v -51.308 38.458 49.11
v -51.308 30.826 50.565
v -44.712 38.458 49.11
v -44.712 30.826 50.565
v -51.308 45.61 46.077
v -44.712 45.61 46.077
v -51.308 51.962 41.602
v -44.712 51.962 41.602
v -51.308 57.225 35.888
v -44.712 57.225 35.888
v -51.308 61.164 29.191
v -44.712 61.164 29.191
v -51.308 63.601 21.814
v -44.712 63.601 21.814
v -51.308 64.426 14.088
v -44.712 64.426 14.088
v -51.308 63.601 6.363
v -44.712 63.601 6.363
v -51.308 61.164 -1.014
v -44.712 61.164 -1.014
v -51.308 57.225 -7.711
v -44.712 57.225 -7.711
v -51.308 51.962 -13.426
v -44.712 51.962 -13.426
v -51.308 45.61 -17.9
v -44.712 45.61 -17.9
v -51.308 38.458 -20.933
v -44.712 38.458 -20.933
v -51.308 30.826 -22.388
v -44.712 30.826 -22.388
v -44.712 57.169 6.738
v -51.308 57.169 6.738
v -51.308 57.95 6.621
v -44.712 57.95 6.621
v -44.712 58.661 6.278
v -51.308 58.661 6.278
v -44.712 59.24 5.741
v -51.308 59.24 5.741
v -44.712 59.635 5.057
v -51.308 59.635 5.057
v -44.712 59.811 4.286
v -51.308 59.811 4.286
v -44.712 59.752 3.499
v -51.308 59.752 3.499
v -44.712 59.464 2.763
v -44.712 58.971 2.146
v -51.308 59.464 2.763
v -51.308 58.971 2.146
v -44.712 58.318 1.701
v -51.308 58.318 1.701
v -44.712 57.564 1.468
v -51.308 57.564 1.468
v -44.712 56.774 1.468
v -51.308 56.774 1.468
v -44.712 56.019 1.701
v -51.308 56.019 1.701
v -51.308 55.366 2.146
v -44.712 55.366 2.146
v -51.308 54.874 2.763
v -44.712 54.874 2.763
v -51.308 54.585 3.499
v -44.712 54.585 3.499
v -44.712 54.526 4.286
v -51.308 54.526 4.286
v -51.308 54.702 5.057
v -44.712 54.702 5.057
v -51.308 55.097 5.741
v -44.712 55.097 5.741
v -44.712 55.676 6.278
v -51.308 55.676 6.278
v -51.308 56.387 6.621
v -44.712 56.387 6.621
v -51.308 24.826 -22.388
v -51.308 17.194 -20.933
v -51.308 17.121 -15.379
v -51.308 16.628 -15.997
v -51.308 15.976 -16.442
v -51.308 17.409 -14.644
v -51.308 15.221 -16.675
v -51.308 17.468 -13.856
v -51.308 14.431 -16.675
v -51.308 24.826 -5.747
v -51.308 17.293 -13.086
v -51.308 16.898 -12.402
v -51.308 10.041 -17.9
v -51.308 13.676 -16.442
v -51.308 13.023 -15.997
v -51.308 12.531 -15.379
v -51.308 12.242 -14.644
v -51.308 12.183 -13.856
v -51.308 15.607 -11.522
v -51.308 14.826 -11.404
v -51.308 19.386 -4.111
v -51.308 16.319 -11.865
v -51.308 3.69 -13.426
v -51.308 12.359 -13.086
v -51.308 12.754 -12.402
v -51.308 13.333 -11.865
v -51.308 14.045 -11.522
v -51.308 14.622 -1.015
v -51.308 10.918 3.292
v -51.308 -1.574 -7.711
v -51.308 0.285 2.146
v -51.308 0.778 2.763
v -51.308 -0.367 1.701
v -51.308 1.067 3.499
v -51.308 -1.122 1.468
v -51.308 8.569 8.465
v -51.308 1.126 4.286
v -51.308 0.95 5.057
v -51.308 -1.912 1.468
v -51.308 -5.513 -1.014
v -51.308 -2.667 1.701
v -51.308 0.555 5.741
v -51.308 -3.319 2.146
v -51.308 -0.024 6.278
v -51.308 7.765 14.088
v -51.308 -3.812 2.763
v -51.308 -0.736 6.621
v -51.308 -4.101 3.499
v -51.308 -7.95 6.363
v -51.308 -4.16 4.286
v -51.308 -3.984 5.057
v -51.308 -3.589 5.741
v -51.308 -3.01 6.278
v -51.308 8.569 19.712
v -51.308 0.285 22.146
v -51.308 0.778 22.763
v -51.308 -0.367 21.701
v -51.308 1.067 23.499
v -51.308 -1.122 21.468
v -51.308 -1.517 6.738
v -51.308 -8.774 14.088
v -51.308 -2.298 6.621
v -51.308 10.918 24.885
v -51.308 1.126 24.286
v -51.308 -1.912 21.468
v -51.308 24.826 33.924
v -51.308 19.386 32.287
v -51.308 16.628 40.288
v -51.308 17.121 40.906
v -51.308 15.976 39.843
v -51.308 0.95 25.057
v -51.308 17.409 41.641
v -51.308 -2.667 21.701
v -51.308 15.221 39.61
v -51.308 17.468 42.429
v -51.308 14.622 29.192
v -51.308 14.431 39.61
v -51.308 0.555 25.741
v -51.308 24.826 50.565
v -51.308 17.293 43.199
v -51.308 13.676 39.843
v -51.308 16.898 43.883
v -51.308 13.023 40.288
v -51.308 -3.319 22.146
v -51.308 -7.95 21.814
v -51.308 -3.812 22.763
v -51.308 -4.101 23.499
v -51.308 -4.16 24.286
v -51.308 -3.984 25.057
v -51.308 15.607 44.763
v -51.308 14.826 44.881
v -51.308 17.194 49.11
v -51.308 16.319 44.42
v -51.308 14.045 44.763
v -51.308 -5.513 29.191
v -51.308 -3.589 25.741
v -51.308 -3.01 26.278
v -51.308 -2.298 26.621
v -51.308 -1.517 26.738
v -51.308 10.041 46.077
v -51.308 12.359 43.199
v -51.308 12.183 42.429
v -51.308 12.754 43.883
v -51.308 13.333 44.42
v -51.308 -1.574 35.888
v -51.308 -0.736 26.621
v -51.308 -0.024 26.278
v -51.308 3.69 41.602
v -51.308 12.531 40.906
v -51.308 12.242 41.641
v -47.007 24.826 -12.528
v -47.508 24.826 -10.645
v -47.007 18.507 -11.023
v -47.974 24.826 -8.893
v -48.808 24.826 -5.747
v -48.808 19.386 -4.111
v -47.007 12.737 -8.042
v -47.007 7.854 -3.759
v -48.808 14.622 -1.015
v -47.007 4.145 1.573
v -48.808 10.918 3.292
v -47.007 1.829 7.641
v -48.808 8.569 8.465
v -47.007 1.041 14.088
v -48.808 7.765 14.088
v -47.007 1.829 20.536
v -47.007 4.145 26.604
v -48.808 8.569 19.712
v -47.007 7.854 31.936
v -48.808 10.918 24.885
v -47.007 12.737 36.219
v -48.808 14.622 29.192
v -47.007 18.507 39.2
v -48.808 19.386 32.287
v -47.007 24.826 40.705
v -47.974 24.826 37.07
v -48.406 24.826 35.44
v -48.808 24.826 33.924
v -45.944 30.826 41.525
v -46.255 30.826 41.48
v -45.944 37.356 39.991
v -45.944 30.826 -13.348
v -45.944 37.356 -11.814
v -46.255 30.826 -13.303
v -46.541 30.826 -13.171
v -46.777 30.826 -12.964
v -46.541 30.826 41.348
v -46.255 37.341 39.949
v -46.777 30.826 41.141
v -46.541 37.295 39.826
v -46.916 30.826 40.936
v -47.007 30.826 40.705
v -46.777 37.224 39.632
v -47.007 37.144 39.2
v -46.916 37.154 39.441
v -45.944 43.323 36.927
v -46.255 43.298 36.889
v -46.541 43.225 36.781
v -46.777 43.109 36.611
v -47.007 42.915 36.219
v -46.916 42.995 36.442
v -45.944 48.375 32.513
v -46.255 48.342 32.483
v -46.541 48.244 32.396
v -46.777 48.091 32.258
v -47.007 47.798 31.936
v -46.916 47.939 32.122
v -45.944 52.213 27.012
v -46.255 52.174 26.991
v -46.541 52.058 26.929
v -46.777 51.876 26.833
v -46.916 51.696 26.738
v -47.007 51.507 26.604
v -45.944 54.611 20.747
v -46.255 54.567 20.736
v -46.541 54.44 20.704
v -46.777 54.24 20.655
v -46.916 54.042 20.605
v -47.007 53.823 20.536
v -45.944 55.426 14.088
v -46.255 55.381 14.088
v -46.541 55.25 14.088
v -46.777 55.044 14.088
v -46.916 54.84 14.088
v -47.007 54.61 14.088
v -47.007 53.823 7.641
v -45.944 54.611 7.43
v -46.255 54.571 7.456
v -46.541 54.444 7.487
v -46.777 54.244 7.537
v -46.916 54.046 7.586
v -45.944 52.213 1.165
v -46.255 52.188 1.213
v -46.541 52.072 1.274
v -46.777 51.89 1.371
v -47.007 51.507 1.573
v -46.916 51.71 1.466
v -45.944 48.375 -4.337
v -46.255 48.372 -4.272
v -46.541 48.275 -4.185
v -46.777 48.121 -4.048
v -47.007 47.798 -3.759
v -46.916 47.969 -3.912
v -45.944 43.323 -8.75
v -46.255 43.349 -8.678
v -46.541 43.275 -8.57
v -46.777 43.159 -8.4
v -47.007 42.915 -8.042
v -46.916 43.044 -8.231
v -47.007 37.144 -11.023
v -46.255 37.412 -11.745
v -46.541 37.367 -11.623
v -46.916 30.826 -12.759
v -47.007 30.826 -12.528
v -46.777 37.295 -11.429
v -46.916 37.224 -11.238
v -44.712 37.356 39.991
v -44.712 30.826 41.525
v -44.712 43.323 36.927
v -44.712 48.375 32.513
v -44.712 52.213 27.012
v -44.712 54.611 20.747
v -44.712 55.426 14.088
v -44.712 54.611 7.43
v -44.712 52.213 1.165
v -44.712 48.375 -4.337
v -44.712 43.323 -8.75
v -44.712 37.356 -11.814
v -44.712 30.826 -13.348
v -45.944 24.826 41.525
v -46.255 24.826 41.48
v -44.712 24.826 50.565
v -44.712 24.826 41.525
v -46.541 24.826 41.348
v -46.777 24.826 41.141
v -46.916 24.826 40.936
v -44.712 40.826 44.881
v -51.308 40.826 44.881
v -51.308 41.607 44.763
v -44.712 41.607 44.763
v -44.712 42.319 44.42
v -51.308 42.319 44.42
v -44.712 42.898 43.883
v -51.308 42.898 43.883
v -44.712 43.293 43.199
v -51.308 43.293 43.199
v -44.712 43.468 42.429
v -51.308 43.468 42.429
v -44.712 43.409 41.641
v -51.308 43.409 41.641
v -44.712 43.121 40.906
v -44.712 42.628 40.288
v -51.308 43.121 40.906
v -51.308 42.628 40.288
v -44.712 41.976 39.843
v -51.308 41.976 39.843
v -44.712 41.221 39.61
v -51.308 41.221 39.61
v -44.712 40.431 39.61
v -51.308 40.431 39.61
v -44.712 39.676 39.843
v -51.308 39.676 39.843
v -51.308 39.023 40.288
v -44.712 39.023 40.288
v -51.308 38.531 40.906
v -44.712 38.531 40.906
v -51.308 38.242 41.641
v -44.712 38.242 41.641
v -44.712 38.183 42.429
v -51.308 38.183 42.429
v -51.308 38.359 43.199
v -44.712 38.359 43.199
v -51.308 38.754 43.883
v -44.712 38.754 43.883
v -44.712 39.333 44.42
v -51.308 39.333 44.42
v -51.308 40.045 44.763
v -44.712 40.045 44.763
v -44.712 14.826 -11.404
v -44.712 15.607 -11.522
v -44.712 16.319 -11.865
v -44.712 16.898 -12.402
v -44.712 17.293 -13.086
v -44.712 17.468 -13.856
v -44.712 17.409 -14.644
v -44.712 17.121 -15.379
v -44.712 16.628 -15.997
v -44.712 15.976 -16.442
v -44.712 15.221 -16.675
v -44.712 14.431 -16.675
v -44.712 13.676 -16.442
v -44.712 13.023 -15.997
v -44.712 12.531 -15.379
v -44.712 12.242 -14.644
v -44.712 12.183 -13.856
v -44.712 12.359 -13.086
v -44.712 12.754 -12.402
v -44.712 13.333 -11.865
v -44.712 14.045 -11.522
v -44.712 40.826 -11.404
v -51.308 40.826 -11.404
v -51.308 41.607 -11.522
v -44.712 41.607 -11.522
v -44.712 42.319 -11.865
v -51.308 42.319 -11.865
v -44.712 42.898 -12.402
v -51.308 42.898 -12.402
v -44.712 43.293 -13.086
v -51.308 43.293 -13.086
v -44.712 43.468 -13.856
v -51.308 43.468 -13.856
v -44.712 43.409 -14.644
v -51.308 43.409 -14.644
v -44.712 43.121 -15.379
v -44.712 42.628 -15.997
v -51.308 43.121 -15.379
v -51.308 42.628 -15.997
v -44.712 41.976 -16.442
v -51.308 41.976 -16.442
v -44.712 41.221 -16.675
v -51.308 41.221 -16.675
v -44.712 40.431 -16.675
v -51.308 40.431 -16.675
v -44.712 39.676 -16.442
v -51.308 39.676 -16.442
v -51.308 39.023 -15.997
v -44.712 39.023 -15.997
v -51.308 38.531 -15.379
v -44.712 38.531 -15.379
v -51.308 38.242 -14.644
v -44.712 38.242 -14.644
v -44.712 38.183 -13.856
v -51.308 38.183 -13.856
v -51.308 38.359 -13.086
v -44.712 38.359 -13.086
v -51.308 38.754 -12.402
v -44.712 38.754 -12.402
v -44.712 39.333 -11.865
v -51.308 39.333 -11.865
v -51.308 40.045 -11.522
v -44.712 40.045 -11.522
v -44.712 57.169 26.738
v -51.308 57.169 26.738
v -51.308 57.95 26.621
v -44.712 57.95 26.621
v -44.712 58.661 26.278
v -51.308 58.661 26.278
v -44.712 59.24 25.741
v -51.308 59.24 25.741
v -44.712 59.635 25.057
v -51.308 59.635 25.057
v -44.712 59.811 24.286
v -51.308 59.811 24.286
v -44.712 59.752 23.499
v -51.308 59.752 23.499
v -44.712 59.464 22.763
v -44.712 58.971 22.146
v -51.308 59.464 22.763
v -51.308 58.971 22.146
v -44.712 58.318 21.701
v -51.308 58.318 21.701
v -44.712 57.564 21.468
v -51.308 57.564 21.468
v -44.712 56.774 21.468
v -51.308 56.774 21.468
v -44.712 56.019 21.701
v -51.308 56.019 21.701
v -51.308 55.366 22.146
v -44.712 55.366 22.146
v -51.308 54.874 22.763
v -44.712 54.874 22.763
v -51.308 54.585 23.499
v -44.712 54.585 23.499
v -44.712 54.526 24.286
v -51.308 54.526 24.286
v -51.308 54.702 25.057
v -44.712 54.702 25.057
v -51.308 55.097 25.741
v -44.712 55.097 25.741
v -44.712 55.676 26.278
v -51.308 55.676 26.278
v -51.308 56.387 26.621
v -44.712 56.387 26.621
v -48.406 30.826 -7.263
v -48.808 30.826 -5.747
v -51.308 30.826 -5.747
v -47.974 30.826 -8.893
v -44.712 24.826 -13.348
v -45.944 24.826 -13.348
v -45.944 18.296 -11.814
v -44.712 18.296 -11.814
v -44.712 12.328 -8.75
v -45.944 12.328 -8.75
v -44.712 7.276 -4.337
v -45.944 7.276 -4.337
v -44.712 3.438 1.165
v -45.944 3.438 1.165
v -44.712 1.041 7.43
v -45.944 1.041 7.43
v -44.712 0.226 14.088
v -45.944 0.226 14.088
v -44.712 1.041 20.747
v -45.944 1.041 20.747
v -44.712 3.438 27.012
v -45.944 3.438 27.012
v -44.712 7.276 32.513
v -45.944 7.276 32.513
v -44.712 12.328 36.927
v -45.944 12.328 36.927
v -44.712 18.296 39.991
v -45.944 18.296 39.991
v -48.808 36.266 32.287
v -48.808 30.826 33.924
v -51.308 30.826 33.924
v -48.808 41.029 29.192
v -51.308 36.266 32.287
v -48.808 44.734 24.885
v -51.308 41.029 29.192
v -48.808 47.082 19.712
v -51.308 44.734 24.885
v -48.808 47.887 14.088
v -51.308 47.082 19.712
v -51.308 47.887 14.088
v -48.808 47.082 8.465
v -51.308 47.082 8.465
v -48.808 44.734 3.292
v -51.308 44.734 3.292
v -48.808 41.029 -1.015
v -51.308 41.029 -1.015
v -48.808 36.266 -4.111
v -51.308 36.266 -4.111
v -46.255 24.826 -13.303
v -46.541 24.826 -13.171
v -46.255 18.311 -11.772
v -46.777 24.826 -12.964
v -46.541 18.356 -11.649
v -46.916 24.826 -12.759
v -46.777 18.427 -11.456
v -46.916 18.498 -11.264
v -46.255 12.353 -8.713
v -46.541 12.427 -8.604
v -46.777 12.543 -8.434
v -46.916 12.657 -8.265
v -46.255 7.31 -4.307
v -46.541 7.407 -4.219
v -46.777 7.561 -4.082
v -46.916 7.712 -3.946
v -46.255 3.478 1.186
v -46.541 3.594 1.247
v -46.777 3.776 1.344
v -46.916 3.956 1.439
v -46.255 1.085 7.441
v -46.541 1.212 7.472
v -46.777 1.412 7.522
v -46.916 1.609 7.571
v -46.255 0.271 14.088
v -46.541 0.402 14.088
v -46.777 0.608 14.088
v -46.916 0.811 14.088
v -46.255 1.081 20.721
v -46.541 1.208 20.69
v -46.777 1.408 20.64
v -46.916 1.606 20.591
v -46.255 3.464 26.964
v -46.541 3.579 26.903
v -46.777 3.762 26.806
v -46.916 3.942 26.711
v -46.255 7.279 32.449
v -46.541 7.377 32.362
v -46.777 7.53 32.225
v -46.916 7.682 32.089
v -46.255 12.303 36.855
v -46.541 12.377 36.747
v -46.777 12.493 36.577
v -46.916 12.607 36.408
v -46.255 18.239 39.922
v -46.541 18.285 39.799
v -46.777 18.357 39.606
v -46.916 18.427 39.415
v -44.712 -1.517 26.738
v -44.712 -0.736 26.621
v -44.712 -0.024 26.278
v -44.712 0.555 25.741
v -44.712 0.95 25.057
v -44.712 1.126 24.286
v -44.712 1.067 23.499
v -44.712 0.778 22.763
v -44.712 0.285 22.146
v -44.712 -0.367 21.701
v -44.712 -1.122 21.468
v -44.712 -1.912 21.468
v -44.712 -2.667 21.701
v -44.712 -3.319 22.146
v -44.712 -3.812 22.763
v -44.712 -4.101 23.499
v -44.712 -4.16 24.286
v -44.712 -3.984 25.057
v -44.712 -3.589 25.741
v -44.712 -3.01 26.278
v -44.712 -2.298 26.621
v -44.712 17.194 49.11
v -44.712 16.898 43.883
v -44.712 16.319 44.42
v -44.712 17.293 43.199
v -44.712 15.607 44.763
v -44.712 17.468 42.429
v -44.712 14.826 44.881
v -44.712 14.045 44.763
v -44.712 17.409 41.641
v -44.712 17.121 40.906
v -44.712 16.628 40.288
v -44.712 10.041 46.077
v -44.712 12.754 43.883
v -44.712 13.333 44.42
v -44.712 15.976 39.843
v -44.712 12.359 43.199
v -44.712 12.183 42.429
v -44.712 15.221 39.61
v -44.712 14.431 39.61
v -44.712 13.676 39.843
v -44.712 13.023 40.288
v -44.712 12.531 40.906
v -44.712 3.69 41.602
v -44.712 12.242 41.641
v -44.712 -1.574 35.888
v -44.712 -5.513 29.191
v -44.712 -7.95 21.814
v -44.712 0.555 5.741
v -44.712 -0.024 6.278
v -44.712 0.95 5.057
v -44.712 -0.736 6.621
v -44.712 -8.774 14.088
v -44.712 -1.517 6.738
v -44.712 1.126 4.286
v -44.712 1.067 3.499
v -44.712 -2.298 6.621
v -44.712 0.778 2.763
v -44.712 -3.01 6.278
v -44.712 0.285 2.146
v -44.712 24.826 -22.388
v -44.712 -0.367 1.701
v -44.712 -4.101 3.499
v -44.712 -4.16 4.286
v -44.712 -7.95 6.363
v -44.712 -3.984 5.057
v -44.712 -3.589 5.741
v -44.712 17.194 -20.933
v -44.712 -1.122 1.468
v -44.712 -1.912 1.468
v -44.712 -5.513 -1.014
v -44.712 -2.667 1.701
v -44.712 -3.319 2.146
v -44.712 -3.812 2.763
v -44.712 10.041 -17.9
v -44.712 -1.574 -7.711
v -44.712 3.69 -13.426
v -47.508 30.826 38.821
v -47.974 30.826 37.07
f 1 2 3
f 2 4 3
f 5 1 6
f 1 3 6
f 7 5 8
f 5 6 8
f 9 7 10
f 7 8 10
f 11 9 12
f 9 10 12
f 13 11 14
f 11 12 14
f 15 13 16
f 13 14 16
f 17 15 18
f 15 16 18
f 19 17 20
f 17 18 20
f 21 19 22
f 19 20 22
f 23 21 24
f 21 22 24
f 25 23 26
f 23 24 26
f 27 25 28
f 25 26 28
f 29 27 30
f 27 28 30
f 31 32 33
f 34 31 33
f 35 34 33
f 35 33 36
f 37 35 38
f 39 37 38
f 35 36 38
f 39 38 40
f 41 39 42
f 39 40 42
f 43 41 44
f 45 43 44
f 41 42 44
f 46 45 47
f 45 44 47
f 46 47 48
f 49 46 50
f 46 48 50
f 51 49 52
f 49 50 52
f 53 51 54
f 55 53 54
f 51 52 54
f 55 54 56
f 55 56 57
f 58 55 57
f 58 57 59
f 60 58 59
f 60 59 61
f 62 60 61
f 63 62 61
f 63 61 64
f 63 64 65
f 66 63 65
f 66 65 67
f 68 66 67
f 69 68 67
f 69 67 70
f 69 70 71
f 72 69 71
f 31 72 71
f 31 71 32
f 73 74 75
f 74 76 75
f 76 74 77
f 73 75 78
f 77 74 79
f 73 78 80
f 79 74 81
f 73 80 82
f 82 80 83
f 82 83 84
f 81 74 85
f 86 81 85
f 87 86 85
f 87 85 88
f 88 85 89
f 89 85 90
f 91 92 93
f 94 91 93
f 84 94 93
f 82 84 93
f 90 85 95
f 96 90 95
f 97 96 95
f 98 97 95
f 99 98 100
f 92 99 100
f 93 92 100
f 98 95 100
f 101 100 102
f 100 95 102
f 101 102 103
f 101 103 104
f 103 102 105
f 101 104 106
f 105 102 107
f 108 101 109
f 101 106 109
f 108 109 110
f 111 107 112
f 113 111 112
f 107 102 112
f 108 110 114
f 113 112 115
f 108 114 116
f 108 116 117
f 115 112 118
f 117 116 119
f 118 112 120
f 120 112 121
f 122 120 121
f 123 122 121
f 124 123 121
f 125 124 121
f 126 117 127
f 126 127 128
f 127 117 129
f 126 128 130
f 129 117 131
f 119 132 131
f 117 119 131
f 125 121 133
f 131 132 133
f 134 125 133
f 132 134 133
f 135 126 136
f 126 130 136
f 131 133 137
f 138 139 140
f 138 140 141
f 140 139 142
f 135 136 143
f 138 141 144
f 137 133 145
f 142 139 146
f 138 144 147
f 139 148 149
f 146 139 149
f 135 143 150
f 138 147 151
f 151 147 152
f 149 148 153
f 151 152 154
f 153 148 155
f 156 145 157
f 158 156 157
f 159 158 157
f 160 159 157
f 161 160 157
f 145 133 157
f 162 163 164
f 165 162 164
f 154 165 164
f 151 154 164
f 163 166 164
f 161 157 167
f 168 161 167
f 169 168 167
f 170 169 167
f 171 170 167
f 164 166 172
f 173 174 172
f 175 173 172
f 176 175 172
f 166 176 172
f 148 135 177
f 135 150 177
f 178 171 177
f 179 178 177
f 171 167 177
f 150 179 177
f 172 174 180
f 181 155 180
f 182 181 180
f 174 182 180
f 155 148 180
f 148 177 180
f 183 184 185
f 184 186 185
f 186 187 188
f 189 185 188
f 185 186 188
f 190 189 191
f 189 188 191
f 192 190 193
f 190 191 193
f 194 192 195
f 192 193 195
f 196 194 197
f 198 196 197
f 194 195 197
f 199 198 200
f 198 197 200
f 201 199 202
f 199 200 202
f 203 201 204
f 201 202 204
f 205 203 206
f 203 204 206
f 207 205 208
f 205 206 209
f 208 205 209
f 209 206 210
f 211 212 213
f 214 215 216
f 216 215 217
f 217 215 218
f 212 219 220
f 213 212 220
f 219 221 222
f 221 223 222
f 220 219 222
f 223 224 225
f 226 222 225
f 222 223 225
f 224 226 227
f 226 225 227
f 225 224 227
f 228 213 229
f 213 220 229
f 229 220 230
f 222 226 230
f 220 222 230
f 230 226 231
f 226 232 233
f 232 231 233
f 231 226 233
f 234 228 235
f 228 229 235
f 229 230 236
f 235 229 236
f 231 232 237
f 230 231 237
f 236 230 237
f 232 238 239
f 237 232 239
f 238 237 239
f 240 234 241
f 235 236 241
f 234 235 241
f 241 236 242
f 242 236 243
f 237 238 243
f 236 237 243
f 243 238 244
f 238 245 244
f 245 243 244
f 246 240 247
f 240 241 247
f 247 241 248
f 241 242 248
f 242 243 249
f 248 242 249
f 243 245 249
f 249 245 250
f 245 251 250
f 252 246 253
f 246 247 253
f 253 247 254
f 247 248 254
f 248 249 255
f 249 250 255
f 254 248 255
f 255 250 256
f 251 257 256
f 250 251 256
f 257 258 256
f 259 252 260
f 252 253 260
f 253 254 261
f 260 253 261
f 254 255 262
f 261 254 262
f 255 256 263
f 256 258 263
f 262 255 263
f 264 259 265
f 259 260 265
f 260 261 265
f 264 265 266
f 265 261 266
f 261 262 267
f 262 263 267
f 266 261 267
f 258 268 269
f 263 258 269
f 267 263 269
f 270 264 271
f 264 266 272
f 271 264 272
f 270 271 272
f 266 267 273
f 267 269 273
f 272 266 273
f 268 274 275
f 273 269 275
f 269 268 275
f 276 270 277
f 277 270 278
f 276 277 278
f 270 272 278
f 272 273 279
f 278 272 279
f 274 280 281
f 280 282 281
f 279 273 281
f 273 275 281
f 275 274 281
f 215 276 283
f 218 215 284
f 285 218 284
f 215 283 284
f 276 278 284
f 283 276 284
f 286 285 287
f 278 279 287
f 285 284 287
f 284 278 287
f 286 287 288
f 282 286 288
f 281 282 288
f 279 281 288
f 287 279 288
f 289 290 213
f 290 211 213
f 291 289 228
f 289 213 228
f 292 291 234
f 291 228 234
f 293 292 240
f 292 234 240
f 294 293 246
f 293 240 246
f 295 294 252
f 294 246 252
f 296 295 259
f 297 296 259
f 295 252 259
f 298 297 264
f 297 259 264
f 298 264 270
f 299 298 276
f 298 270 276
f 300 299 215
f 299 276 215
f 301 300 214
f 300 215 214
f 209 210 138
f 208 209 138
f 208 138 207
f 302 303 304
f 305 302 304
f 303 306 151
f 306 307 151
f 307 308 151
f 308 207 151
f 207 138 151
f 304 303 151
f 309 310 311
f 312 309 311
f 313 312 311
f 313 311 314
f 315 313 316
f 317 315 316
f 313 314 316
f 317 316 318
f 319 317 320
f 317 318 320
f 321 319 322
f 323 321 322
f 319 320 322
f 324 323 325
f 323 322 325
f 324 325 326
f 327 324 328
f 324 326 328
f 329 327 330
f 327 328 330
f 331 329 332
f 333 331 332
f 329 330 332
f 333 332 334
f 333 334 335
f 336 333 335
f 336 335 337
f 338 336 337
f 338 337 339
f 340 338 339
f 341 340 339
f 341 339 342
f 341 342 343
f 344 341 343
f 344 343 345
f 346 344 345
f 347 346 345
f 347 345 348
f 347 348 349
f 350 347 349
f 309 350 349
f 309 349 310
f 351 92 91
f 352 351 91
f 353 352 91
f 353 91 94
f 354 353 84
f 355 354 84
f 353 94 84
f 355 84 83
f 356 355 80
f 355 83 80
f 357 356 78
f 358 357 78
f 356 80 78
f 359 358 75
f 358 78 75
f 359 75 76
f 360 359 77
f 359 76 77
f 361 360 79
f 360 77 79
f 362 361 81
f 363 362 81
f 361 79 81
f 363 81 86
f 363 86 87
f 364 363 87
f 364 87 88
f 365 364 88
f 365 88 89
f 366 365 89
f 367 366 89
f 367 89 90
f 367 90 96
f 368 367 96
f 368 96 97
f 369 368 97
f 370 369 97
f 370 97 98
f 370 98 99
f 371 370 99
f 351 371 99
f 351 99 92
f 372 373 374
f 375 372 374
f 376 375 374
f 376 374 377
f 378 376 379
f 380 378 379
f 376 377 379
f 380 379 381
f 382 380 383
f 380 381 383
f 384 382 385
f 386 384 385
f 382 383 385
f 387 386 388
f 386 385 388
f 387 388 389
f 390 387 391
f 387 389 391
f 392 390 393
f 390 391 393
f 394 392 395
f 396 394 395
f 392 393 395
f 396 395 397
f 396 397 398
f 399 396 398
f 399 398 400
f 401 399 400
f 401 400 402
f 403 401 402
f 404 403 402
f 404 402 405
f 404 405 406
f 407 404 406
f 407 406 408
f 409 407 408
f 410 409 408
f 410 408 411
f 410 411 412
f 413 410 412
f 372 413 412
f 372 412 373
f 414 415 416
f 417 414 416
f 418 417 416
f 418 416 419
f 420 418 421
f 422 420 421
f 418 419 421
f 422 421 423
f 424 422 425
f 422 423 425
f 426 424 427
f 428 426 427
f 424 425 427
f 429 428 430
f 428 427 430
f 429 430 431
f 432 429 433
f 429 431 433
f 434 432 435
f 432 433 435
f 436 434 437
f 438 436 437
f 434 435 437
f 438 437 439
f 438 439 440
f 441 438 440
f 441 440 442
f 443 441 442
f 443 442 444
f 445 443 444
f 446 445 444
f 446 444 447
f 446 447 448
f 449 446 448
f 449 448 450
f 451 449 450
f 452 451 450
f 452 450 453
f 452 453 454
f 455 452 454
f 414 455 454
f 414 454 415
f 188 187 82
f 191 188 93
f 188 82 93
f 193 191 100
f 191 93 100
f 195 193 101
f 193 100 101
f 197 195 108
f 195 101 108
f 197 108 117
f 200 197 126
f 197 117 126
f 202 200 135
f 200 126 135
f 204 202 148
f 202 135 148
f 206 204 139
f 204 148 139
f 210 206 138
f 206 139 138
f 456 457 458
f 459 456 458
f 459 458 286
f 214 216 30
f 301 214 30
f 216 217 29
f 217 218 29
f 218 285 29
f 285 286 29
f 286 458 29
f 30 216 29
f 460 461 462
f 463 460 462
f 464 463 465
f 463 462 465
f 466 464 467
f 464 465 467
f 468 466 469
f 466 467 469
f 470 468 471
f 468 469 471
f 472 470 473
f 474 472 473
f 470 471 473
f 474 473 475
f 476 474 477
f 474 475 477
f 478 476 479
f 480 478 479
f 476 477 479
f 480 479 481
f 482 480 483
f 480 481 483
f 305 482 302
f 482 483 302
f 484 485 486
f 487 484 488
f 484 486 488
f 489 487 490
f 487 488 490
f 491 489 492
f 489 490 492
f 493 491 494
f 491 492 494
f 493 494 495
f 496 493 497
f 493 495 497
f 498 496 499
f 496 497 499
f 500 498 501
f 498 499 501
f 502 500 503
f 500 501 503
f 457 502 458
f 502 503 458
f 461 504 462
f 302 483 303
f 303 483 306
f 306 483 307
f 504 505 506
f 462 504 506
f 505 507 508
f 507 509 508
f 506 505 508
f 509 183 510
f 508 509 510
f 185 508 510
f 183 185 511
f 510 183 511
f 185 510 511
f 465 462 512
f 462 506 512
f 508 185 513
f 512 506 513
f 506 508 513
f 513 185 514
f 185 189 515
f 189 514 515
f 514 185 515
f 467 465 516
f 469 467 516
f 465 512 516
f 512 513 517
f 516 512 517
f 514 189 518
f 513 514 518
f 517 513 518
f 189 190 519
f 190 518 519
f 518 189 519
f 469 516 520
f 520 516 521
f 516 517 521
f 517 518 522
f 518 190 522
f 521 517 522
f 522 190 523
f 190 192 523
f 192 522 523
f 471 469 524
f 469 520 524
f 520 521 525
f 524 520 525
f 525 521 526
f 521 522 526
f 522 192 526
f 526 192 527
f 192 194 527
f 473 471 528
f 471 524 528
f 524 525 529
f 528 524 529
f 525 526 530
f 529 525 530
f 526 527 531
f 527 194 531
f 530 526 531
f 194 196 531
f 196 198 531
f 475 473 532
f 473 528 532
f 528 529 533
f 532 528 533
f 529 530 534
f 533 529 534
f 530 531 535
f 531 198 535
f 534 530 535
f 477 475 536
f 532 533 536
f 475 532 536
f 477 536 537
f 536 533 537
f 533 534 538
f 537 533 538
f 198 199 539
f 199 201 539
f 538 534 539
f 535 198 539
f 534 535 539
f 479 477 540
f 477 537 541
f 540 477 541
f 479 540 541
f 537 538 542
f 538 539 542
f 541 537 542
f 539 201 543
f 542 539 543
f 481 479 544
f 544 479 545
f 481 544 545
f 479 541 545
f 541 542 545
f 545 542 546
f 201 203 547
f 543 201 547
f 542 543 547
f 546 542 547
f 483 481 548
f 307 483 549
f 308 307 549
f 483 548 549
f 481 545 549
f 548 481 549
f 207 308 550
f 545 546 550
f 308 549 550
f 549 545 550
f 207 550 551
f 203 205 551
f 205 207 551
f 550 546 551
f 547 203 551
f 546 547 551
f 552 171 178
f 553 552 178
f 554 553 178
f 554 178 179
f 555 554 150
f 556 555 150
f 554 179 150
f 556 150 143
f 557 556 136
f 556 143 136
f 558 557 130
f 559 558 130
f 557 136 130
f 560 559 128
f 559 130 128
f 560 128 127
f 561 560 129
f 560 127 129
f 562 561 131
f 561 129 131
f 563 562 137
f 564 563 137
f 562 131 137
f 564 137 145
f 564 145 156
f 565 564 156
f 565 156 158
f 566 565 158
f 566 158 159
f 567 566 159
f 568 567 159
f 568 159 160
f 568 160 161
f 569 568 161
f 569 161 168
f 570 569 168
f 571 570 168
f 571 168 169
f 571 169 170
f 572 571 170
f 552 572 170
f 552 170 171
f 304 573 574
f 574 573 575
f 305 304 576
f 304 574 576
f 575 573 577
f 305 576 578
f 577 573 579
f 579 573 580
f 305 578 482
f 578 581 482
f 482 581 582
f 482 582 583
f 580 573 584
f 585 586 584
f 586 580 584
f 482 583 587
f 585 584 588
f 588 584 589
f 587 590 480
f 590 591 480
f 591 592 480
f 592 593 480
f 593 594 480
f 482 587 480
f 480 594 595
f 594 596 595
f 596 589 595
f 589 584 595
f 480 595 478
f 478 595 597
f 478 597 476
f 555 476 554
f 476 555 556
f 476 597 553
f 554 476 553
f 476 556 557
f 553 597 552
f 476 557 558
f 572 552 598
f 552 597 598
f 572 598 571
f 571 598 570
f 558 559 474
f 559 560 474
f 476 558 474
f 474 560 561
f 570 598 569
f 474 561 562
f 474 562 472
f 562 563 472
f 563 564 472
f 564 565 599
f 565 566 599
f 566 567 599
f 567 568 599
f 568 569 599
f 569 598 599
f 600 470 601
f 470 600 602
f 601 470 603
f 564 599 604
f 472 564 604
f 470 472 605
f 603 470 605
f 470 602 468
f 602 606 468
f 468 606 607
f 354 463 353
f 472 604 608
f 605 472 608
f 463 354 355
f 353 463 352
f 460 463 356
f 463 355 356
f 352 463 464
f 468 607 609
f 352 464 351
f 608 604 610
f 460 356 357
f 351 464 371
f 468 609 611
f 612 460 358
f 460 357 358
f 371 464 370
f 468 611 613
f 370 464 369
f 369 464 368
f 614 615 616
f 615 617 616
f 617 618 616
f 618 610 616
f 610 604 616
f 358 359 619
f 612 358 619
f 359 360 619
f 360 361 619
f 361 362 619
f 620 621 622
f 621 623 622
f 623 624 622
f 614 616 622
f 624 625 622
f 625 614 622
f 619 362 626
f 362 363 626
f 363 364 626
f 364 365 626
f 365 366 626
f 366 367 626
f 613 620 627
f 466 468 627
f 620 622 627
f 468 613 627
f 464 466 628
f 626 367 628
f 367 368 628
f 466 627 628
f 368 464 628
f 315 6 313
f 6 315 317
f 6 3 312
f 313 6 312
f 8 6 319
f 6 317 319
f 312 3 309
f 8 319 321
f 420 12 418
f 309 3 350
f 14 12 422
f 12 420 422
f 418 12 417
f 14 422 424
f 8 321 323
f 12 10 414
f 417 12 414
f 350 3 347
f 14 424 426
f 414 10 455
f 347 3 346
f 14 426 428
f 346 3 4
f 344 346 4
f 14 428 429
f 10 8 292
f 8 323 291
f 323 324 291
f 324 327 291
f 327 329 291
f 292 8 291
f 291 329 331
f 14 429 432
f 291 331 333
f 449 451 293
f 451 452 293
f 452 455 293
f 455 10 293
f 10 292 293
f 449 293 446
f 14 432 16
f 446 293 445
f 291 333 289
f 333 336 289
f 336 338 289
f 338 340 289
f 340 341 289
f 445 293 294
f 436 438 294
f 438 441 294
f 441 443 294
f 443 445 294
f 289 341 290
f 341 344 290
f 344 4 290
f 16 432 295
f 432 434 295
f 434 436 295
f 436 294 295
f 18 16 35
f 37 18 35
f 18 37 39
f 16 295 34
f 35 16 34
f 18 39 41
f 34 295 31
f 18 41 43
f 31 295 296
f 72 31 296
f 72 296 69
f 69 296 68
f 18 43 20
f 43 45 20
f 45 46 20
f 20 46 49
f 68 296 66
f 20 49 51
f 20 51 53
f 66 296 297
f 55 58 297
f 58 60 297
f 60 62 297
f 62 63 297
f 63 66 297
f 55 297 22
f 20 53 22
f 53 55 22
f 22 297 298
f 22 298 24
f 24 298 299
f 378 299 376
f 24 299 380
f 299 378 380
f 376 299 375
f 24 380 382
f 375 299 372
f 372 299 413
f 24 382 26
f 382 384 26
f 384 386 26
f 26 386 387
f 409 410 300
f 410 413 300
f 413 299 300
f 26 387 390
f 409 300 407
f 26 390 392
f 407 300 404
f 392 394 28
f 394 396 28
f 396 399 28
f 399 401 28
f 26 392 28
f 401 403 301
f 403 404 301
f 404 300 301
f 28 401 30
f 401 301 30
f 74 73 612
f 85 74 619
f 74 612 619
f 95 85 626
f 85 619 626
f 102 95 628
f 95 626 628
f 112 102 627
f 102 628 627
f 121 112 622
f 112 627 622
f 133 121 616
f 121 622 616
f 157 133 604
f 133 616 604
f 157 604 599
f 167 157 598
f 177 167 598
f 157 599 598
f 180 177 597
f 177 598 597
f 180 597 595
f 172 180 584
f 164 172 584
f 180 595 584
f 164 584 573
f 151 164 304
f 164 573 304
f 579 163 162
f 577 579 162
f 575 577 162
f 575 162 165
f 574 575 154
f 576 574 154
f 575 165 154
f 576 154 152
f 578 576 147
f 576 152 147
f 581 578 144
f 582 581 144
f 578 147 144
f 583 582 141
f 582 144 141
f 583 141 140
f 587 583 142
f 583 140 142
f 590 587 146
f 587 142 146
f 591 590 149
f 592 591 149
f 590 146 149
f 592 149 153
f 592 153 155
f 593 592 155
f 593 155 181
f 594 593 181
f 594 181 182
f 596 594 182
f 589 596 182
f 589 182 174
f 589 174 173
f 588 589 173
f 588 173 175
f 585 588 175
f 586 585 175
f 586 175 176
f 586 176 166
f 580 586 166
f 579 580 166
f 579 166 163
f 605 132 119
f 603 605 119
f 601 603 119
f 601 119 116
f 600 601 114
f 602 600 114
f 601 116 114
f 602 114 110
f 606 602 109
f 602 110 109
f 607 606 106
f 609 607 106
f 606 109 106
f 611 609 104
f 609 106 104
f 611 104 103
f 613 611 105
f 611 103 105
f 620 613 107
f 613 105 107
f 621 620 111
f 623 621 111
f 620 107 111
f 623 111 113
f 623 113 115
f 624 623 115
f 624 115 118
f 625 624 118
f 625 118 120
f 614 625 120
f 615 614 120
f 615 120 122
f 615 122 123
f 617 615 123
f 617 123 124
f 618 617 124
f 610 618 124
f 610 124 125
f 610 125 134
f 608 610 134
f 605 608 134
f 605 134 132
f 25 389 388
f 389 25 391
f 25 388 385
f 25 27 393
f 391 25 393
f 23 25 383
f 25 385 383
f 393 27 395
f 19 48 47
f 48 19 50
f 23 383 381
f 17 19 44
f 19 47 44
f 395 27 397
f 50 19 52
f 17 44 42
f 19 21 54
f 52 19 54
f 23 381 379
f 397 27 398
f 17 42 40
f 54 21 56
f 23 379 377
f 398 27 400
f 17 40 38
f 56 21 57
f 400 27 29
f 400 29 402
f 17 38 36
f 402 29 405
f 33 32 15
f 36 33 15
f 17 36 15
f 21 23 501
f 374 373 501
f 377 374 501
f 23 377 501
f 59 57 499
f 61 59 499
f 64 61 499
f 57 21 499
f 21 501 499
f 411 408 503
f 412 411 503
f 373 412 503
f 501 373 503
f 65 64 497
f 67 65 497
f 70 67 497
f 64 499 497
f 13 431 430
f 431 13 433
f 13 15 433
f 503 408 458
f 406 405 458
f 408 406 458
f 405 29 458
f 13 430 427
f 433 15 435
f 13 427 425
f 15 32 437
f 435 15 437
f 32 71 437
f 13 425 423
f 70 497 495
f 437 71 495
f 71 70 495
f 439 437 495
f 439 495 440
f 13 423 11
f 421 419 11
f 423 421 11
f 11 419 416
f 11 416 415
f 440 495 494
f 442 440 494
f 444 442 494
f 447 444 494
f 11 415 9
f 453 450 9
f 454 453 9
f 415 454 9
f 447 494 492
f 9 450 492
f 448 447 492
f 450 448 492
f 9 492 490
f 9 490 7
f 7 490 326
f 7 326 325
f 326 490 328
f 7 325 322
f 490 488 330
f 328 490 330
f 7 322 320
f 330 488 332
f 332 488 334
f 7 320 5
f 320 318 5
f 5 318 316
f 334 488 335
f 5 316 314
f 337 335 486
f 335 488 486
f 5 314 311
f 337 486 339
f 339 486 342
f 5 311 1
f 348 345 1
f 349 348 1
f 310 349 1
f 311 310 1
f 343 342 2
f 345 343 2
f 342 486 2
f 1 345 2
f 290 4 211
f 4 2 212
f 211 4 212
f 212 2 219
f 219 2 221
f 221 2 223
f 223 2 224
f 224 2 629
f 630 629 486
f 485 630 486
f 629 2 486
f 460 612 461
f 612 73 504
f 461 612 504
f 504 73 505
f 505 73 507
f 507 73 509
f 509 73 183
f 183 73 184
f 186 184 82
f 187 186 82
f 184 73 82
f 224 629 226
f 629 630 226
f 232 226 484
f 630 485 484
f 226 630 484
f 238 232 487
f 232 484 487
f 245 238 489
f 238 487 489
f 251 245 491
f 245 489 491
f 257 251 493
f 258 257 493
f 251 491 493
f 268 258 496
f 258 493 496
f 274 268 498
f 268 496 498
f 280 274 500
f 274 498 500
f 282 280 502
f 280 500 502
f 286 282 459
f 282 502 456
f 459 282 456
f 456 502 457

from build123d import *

# Parameters (mm, degrees)
SKETCH4_R          = 2.65
CUT_EXTRUDE1_DEPTH = 10


with BuildPart() as part:
    # Sketch3 → Revolve1 (revolve)
    with BuildSketch(Plane.ZX.offset(27.825791751), mode=Mode.PRIVATE) as revolve1_sk:
        with BuildLine():
            Line((50.688396198, -44.711654686), (41.688396198, -44.711654686))
            Line((41.688396198, -44.711654686), (41.688396198, -45.944086976))
            ThreePointArc((41.688396198, -45.944086976), (41.461084873, -46.613724548), (40.873097148, -47.006605385))
            Line((40.873097148, -47.006605385), (34.149278103, -48.808247268))
            Line((34.149278103, -48.808247268), (34.149278103, -51.308247268))
            Line((34.149278103, -51.308247268), (50.688396198, -51.308247268))
            Line((50.688396198, -51.308247268), (50.688396198, -44.711654686))
        make_face()
    revolve(revolve1_sk.sketch.rotate(Axis((-48.711654686, 27.825791751, 14.088396198), (-1, 0, 0)), 180), axis=Axis((-48.711654686, 27.825791751, 14.088396198), (-1, 0, 0)))

    # Sketch4 → Cut-Extrude1 (cut)
    with BuildSketch(Plane.ZY.offset(51.308247268)):
        with BuildLine():
            Line((33.923692586, 24.825791751), (50.565238167, 24.825791751))
            ThreePointArc((50.565238167, 24.825791751), (50.657593729, 26.324528291), (50.688396198, 27.825791751))
            ThreePointArc((50.688396198, 27.825791751), (50.657593729, 29.327055211), (50.565238167, 30.825791751))
            Line((50.565238167, 30.825791751), (33.923692586, 30.825791751))
            ThreePointArc((33.923692586, 30.825791751), (34.092802228, 29.330026509), (34.149278103, 27.825791751))
            ThreePointArc((34.149278103, 27.825791751), (34.092802228, 26.321556993), (33.923692586, 24.825791751))
        make_face()
        with BuildLine():
            ThreePointArc((-22.38844577, 30.825791751), (-22.511603802, 27.825791751), (-22.38844577, 24.825791751))
            Line((-22.38844577, 24.825791751), (-5.746900189, 24.825791751))
            ThreePointArc((-5.746900189, 24.825791751), (-5.972485706, 27.825791751), (-5.746900189, 30.825791751))
            Line((-5.746900189, 30.825791751), (-22.38844577, 30.825791751))
        make_face()
        with BuildLine():
            Line((-5.746900189, 24.825791751), (33.923692586, 24.825791751))
            ThreePointArc((33.923692586, 24.825791751), (34.092802228, 26.321556993), (34.149278103, 27.825791751))
            ThreePointArc((34.149278103, 27.825791751), (34.092802228, 29.330026509), (33.923692586, 30.825791751))
            Line((33.923692586, 30.825791751), (-5.746900189, 30.825791751))
            ThreePointArc((-5.746900189, 30.825791751), (-5.972485706, 27.825791751), (-5.746900189, 24.825791751))
        make_face()
        with Locations((24.088396198, 57.168593253)):
            Circle(SKETCH4_R)
        with Locations((4.088396198, 57.168593253)):
            Circle(SKETCH4_R)
        with Locations((-14.054098361, 40.825791751)):
            Circle(SKETCH4_R)
        with Locations((-14.054098361, 14.825791751)):
            Circle(SKETCH4_R)
        with Locations((4.088396198, -1.517009751)):
            Circle(SKETCH4_R)
        with Locations((24.088396198, -1.517009751)):
            Circle(SKETCH4_R)
        with Locations((42.230890757, 14.825791751)):
            Circle(SKETCH4_R)
        with Locations((42.230890757, 40.825791751)):
            Circle(SKETCH4_R)
    extrude(amount=-CUT_EXTRUDE1_DEPTH, mode=Mode.SUBTRACT)


with BuildPart() as cut_extrude1_piece_1:
    # of the separate pieces the step leaves, piece 1, a body of its own (cut_extrude1_pieces)
    add(part.part.solids().sort_by_distance((-44.711654686, 24.825791751, -22.38844577))[0])


with BuildPart() as cut_extrude1_piece_2:
    # of the separate pieces the step leaves, piece 2, a body of its own (cut_extrude1_pieces)
    add(part.part.solids().sort_by_distance((-44.711654686, 30.825791751, 50.565238167))[0])


solid = Compound([cut_extrude1_piece_1.part, cut_extrude1_piece_2.part])
